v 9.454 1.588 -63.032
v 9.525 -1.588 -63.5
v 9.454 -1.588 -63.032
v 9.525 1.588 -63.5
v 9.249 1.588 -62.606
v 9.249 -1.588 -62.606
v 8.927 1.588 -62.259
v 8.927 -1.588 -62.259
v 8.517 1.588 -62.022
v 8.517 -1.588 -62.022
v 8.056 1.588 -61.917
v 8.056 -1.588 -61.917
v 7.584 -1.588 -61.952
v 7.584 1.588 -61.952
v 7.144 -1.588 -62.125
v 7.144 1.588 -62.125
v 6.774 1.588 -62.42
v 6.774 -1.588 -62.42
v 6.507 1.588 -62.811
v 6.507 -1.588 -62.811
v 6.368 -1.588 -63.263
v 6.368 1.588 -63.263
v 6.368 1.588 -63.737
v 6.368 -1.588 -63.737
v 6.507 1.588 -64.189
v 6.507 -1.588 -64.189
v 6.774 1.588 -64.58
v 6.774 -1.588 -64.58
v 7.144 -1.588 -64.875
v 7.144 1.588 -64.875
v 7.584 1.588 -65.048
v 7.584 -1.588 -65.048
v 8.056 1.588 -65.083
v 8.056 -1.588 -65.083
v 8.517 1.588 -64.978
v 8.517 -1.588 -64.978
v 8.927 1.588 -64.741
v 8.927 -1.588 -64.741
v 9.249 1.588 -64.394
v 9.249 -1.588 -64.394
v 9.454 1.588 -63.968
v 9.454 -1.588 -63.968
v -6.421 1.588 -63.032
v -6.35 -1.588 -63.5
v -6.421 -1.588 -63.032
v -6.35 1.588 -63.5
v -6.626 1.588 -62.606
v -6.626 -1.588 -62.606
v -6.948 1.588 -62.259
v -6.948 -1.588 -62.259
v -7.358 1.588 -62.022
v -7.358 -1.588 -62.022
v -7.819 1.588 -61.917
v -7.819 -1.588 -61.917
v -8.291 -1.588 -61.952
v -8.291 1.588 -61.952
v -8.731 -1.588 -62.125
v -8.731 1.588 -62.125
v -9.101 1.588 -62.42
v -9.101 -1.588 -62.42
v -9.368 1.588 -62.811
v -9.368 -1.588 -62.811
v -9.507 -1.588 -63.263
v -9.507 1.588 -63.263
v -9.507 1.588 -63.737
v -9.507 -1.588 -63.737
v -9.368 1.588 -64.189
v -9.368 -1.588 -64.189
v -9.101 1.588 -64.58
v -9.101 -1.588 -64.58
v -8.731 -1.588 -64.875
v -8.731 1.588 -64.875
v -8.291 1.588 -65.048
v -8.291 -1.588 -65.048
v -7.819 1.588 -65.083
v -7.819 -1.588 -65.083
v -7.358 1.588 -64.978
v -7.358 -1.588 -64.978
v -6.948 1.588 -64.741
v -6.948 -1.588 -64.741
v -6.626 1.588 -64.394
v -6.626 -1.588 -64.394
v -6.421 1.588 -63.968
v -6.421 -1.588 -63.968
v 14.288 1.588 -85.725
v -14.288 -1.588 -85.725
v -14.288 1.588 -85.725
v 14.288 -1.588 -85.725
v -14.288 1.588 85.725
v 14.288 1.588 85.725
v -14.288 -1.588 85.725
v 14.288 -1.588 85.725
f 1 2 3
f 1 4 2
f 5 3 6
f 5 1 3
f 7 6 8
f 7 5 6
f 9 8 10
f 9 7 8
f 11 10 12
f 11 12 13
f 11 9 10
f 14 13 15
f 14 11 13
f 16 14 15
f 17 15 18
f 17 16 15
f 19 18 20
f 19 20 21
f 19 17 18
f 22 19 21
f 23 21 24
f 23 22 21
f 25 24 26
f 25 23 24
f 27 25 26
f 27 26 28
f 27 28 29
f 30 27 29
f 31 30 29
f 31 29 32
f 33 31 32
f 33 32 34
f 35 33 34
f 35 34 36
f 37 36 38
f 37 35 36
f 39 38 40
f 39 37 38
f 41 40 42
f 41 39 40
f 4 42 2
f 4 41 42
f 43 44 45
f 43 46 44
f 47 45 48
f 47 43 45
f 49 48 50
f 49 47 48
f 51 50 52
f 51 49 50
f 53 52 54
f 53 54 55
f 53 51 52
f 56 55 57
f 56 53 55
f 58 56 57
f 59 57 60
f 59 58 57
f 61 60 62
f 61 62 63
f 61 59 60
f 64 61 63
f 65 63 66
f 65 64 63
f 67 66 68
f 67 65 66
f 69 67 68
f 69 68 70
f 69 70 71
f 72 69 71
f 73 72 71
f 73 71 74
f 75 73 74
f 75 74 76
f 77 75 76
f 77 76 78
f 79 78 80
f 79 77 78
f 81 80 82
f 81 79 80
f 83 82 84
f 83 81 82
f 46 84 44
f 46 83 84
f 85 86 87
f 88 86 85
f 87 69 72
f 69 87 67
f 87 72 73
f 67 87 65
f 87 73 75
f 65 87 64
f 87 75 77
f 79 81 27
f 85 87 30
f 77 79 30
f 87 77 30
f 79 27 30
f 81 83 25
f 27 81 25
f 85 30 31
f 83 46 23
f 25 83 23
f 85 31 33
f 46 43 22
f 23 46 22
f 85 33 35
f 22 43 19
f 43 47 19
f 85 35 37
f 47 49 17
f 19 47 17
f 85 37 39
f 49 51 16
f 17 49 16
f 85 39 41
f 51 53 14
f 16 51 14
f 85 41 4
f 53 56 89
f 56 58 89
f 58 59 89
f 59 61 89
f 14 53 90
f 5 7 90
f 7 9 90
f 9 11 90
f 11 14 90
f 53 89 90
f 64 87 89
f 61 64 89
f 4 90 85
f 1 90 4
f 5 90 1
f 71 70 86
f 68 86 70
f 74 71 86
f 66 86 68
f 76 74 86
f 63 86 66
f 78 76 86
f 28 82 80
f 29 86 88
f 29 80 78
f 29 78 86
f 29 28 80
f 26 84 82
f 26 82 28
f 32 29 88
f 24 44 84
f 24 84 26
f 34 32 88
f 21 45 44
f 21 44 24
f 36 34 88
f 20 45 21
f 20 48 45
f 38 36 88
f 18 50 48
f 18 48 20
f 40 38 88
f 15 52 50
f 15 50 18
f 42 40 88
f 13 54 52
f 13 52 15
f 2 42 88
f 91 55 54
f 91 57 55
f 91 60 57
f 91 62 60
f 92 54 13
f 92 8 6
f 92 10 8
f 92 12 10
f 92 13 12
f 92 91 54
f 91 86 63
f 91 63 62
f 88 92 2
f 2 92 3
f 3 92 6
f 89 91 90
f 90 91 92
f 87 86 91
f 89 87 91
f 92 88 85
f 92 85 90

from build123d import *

# Parameters (mm, degrees)
F0_W     = 28.575
F0_H     = 171.45
F0_R     = 1.5875
F1_DEPTH = 1.5875


with BuildPart() as f1:
    # F0 (on Front) → F1 (new body, symmetric)
    with BuildSketch(Plane.XZ):
        Rectangle(F0_W, F0_H)
        with Locations((-7.9375, -63.5)):
            Circle(F0_R, mode=Mode.SUBTRACT)
        with Locations((7.9375, -63.5)):
            Circle(F0_R, mode=Mode.SUBTRACT)
    extrude(amount=F1_DEPTH, both=True)


solid = f1.part
